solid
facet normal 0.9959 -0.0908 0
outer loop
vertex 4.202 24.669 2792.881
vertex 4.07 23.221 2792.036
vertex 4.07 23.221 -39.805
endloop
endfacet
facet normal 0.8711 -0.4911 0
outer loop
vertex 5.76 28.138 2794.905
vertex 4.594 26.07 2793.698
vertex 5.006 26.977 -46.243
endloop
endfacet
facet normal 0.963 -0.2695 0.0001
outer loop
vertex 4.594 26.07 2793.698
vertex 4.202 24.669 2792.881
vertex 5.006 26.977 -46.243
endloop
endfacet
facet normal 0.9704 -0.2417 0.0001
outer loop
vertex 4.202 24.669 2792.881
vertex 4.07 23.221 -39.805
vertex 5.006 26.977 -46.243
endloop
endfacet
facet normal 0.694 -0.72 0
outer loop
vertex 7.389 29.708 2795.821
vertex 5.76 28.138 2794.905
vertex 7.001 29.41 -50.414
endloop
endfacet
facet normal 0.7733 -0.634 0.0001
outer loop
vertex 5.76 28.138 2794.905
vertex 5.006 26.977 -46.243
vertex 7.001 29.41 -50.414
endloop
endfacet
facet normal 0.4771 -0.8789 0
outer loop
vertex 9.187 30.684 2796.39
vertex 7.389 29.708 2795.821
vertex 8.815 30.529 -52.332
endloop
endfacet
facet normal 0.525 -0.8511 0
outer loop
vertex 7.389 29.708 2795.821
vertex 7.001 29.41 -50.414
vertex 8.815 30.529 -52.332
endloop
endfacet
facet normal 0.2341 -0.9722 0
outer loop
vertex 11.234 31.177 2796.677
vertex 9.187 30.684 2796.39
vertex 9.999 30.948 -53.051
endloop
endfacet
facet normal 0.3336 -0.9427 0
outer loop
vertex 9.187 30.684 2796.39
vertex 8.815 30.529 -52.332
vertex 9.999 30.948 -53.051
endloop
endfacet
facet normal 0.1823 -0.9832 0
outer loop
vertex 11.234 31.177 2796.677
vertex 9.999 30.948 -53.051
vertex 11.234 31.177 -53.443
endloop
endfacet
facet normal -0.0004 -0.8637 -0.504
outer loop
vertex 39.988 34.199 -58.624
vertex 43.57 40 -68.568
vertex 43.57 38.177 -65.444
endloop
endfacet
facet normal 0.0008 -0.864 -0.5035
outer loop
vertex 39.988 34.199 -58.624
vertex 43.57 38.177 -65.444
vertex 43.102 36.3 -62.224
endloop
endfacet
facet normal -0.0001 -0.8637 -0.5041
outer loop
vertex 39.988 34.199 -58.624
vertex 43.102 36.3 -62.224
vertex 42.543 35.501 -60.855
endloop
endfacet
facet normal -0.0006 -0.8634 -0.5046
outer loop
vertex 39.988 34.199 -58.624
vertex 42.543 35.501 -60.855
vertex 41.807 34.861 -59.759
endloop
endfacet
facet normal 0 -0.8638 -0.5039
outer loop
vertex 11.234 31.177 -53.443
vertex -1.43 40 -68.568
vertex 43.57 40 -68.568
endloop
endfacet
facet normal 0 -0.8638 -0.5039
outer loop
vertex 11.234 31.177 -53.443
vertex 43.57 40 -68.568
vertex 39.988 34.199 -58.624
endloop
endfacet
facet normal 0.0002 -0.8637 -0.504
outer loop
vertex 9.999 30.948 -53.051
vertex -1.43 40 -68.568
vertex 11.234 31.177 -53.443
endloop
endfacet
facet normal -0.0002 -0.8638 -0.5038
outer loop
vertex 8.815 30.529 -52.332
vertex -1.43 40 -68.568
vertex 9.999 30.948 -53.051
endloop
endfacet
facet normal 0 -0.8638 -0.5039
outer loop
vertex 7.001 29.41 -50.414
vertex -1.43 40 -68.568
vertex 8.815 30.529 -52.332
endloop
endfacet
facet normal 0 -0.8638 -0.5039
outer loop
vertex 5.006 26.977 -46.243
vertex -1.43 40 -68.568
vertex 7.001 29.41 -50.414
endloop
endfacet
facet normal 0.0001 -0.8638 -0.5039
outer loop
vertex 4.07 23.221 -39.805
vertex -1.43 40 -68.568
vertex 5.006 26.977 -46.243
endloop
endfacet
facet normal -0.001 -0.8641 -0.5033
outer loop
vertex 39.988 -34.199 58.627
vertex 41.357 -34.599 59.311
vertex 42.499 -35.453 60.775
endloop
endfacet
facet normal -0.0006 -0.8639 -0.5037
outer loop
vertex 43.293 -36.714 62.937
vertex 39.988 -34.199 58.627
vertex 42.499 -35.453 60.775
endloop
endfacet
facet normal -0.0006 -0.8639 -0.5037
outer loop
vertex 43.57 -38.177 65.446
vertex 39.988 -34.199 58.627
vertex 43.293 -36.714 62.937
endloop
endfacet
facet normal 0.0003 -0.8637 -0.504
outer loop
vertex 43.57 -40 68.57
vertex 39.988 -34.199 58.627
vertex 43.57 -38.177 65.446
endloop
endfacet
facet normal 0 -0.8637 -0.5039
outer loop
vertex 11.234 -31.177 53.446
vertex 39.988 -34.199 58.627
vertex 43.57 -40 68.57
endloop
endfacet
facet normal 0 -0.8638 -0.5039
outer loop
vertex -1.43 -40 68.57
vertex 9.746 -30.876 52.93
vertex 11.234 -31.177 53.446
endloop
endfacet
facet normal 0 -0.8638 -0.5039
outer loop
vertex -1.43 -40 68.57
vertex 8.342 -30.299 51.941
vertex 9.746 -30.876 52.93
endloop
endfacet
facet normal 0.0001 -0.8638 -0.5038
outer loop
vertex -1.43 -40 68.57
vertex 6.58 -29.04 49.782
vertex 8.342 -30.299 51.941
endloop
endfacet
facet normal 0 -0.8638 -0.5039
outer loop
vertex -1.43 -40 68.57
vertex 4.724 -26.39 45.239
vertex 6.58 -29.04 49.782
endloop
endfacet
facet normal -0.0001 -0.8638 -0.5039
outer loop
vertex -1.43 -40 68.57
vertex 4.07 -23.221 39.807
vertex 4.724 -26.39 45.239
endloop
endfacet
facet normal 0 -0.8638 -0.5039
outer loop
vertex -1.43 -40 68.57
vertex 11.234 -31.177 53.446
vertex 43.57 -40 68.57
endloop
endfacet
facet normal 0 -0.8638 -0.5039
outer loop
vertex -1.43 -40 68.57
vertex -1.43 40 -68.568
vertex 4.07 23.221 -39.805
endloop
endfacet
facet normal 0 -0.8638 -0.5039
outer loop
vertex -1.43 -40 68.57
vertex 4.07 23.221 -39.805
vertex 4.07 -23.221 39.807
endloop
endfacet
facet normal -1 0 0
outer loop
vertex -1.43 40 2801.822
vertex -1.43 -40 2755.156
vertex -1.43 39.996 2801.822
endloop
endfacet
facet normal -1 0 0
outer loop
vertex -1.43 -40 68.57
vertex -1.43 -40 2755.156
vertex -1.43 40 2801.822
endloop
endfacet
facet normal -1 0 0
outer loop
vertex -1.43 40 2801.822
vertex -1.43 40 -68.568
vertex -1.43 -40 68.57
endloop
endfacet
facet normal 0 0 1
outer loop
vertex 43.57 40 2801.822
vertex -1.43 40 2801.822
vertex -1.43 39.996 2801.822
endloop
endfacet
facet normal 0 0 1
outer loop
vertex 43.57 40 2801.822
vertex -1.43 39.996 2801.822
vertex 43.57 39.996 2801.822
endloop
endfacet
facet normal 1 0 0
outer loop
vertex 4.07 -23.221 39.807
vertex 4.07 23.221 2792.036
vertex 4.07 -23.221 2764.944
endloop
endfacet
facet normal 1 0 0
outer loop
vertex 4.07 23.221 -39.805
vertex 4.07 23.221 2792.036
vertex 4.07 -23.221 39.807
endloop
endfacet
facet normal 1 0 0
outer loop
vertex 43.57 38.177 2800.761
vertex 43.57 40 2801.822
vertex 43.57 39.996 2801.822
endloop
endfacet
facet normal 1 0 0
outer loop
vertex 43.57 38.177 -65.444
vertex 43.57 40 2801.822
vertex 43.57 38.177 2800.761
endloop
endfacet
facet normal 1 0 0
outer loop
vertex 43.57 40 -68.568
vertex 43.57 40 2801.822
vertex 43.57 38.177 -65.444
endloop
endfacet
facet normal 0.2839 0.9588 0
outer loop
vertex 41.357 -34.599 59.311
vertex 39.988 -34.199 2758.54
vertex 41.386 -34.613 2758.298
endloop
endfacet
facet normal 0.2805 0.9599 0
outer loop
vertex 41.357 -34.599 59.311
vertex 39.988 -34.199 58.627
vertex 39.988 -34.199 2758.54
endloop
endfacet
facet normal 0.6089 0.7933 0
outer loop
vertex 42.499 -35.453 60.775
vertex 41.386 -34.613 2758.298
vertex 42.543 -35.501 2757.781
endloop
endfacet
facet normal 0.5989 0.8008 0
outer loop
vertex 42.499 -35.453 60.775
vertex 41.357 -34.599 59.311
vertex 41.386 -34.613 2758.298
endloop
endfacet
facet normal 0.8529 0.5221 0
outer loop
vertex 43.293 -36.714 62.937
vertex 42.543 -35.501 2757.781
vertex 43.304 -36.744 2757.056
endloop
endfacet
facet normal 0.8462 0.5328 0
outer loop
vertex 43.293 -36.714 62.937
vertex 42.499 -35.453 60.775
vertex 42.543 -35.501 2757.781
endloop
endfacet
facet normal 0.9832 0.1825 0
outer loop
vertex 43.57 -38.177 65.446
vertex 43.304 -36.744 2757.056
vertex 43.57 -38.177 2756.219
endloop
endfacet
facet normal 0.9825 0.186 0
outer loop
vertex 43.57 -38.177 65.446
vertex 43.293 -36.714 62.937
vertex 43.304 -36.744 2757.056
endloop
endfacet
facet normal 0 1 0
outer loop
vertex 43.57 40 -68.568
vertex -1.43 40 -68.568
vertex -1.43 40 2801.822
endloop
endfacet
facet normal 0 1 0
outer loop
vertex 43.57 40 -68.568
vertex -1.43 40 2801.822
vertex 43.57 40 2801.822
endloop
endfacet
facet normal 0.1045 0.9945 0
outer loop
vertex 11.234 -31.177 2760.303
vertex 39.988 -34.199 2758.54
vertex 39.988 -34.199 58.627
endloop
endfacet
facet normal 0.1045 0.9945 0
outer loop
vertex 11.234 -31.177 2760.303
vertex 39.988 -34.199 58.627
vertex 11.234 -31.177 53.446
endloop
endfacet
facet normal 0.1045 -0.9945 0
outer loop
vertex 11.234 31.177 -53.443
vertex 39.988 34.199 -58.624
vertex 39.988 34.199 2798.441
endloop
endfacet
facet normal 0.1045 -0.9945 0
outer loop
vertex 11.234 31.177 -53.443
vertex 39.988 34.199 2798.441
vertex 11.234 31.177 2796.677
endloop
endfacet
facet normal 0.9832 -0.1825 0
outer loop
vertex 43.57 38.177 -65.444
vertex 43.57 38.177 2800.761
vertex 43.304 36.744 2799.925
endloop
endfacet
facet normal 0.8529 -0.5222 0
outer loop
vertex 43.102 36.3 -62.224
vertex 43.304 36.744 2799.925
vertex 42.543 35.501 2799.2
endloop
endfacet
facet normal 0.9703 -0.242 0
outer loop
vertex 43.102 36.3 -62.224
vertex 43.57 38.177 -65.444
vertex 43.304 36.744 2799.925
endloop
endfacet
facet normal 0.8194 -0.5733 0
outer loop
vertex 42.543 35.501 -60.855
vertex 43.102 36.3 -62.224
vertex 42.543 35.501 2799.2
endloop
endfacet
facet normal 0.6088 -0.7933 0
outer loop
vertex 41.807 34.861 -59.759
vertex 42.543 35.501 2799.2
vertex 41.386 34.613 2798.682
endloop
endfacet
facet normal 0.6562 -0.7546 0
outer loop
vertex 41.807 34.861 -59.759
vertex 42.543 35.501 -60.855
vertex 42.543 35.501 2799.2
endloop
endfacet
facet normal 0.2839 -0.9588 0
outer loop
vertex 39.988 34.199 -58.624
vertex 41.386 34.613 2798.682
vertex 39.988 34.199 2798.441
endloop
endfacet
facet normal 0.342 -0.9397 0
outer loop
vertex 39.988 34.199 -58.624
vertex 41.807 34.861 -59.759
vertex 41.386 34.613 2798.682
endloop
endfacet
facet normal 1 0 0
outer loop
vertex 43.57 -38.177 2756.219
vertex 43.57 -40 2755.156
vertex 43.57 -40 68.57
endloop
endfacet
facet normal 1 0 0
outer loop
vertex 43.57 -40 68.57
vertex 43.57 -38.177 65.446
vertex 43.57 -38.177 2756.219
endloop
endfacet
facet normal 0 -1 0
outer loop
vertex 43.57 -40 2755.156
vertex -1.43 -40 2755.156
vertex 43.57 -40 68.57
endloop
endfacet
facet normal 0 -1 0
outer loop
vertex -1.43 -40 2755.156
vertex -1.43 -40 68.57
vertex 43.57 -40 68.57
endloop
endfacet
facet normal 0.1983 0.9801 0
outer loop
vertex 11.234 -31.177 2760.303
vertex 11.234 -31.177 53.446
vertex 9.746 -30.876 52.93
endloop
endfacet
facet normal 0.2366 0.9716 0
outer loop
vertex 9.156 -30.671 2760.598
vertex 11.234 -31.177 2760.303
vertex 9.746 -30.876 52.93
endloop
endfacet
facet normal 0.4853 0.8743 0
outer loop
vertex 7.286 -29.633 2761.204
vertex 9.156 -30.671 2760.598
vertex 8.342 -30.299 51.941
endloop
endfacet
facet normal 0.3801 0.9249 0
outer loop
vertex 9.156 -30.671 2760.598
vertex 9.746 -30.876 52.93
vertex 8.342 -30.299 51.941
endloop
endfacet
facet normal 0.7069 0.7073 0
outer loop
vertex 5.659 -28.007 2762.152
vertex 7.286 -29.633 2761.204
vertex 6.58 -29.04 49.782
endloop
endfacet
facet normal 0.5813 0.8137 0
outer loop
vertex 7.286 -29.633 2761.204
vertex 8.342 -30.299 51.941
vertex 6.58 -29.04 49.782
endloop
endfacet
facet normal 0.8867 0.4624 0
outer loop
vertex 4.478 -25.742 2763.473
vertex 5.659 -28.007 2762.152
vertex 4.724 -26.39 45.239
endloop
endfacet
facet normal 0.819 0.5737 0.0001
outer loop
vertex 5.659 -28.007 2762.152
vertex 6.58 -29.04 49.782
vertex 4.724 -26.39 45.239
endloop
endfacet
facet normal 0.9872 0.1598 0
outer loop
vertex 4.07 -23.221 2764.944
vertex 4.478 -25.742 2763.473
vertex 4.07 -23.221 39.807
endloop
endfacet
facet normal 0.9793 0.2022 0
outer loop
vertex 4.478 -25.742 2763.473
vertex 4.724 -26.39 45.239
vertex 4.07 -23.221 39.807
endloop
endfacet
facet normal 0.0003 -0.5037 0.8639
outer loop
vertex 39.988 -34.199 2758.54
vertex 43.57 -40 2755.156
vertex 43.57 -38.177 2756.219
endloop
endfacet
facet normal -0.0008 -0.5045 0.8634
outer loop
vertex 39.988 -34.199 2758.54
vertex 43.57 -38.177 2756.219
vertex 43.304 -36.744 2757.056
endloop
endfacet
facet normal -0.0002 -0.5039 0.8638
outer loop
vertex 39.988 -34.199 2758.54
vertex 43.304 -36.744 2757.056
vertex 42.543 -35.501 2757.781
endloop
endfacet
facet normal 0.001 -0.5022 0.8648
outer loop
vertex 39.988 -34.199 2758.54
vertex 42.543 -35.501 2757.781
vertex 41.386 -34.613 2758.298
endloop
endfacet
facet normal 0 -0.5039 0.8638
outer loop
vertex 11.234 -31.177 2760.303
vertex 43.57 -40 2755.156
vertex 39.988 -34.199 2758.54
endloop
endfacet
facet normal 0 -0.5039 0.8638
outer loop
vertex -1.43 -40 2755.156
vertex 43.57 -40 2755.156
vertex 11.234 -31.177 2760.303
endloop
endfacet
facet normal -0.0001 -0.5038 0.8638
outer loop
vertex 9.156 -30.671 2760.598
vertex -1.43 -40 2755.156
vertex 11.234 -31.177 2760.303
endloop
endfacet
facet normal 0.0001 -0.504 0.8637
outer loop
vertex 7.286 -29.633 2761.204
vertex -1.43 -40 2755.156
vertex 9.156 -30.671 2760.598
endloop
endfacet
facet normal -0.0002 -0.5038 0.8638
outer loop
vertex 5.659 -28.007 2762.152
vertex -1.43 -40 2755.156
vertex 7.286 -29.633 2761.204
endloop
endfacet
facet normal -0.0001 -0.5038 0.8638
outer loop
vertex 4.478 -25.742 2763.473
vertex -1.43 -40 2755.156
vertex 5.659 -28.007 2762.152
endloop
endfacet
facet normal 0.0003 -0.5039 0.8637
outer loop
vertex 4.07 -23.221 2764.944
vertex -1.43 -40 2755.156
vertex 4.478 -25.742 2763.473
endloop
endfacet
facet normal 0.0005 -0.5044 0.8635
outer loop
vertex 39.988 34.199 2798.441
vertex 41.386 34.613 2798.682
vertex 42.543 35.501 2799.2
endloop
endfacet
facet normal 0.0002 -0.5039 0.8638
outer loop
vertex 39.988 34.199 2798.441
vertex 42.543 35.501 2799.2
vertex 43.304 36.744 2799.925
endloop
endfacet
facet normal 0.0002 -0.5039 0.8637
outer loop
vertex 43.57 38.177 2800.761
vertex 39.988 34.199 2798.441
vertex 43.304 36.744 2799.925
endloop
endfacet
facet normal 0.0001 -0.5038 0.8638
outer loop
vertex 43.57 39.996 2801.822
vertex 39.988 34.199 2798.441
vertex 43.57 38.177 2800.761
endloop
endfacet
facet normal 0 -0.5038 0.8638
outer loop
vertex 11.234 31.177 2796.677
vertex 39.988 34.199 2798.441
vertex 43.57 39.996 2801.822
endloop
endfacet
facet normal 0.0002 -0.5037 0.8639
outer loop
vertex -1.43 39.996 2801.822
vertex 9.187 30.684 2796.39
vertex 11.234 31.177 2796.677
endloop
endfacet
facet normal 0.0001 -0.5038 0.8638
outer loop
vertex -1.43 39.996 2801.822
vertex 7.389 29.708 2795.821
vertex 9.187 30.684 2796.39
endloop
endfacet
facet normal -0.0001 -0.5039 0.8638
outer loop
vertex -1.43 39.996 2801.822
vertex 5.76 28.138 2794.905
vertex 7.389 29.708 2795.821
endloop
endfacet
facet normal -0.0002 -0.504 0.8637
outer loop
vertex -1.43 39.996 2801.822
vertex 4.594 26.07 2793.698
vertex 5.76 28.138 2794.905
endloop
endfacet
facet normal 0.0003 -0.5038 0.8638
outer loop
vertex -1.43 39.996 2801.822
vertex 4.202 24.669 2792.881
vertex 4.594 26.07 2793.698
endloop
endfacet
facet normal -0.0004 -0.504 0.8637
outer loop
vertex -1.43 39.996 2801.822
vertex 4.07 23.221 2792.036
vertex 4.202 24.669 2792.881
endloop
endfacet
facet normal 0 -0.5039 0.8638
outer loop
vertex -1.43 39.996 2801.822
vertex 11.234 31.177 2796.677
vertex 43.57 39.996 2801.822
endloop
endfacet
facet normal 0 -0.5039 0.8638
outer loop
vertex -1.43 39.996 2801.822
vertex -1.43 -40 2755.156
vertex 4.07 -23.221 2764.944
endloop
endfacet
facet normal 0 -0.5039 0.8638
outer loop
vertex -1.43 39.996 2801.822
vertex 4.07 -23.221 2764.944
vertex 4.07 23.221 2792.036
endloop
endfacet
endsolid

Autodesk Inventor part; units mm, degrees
ref_plane "Начальная плоскость" through (0, 0, -68.5714) normal (0, 0, 1) x (1, 0, 0)
ref_plane "Конечная плоскость" through (0, 0, 2801.8221) normal (0, 0, 1) x (1, 0, 0)
sketch "Эскиз" plane through (0, 0, 0) normal (0, 0, 1) x (1, 0, 0)
  line L0 (-1.43, 0) -> (-1.43, 40)
  line L1 (-1.43, 40) -> (43.57, 40)
  line L2 (43.57, 40) -> (43.57, 38.1774)
  line L3 (39.9881, 34.1993) -> (11.2338, 31.1771)
  line L4 (4.07, 23.221) -> (4.07, 0)
  line L5 (4.07, 0) -> (-1.43, 0) construction
  line L6 (23.82, 40) -> (23.82, 32.5) construction
  line L7 (43.57, 34.5758) -> (43.57, 32.5) construction
  line L8 (43.57, 32.5) -> (23.82, 32.5) construction
  line L9 (0, 15) -> (0, -27) construction
  line L10 (-5.539, 0) -> (16.0067, 0) construction
  line L11 (-1.43, 0) -> (-1.43, -40)
  line L12 (-1.43, -40) -> (43.57, -40)
  line L13 (43.57, -40) -> (43.57, -38.1774)
  line L14 (39.9881, -34.1993) -> (11.2338, -31.1771)
  line L15 (4.07, -23.221) -> (4.07, 0)
  arc A0 (11.2338, 31.1771) -> (4.07, 23.221) centre (12.07, 23.221) ccw
  arc A1 (4.07, -23.221) -> (11.2338, -31.1771) centre (12.07, -23.221) ccw
  arc A2 (39.9881, 34.1993) -> (43.57, 38.1774) centre (39.57, 38.1774) ccw
  arc A3 (43.57, -38.1774) -> (39.9881, -34.1993) centre (39.57, -38.1774) ccw
  line L16 (0, 56) -> (0, -56) construction
  line L17 (-15.5135, 0) -> (54.308, 0) construction
  point P0 (4.07, 30.4242)
  point P1 (43.57, -34.5758)
  point P2 (4.07, -30.4242)
  point P3 (23.82, -40)
  point P4 (23.82, -32.5)
  dimension "d0" = 5.5
  dimension "d1" = 40
  dimension "d2" = 45
  dimension "d3" = 7.5
  dimension "d4" = 19.75
  dimension "d5" = 2.0758
  dimension "d23" = 8
  dimension "d24" = 4
  dimension "d25" = 1.43
extrude "Тело" add sketch "Эскиз" along normal up to surface (2870.3936 mm away) from surface at -68.5714
sketch "Sketch3" plane through (0, 0, 0) normal (0, 0, 1) x (1, 0, 0)
  line L0 (0, 0) -> (10, 0)
ref_plane "Work Plane3" through (0, 0, 0) normal (0, -1, 0) x (1, 0, 0)
sketch "Sketch4" plane through (0, 0, 0) normal (0, -1, 0) x (1, 0, 0)
  line L0 (-2, -68.5714) -> (12, -68.5714)
  line L1 (-2, 2801.8221) -> (12, 2801.8221)
  dimension "d29" = 2870.3936
ref_plane "РабПлоскость4" through (91.07, -73.4212, 2735.6598) normal (0, -0.5039, 0.8638) x (1, 0, 0)
split "Разделение1" plane through (91.07, -73.4212, 2735.6598) removes the side toward (0, -0.5039, 0.8638)
ref_plane "РабПлоскость5" through (91.07, -20.1548, 34.5512) normal (0, -0.8638, -0.5039) x (1, 0, 0)
split "Разделение2" plane through (91.07, -20.1548, 34.5512) removes the side toward (0, -0.8638, -0.5039)
equation "\"d0\" = G_T"
equation "\"d1\" = 0.5 * G_H"
equation "\"d2\" = G_W"
equation "\"d3\" = G_T1"
equation "\"d4\" = G_C"
equation "\"d23\" = G_IR"
equation "\"d24\" = G_ER"
equation "\"d25\" = ex"
equation "\"d6\" = G_L"
equation "\"G_W\" = 45"
equation "\"G_T\" = 5.5"
equation "\"G_T1\" = 7.5"
equation "\"G_NG\" = 0.105104"
equation "\"G_ER\" = 4"
equation "\"G_IR\" = 8"
equation "\"G_C\" = 19.75"
equation "\"G_L\" = d29"
equation "\"ex\" = 1.43"
equation "\"G_OFFSET_START\" = 68.57143"
equation "\"G_OFFSET_END\" = 23.33333"
equation "\"d26\" = -G_OFFSET_START"
equation "\"d27\" = G_OFFSET_END + B_L"
equation "\"B_L\" = 2778.4888"
equation "\"G_H\" = 80"
properties part number "ISO 657/11 - CH 80 x 8 - 2870,39" material "Сталь, мягкая"
